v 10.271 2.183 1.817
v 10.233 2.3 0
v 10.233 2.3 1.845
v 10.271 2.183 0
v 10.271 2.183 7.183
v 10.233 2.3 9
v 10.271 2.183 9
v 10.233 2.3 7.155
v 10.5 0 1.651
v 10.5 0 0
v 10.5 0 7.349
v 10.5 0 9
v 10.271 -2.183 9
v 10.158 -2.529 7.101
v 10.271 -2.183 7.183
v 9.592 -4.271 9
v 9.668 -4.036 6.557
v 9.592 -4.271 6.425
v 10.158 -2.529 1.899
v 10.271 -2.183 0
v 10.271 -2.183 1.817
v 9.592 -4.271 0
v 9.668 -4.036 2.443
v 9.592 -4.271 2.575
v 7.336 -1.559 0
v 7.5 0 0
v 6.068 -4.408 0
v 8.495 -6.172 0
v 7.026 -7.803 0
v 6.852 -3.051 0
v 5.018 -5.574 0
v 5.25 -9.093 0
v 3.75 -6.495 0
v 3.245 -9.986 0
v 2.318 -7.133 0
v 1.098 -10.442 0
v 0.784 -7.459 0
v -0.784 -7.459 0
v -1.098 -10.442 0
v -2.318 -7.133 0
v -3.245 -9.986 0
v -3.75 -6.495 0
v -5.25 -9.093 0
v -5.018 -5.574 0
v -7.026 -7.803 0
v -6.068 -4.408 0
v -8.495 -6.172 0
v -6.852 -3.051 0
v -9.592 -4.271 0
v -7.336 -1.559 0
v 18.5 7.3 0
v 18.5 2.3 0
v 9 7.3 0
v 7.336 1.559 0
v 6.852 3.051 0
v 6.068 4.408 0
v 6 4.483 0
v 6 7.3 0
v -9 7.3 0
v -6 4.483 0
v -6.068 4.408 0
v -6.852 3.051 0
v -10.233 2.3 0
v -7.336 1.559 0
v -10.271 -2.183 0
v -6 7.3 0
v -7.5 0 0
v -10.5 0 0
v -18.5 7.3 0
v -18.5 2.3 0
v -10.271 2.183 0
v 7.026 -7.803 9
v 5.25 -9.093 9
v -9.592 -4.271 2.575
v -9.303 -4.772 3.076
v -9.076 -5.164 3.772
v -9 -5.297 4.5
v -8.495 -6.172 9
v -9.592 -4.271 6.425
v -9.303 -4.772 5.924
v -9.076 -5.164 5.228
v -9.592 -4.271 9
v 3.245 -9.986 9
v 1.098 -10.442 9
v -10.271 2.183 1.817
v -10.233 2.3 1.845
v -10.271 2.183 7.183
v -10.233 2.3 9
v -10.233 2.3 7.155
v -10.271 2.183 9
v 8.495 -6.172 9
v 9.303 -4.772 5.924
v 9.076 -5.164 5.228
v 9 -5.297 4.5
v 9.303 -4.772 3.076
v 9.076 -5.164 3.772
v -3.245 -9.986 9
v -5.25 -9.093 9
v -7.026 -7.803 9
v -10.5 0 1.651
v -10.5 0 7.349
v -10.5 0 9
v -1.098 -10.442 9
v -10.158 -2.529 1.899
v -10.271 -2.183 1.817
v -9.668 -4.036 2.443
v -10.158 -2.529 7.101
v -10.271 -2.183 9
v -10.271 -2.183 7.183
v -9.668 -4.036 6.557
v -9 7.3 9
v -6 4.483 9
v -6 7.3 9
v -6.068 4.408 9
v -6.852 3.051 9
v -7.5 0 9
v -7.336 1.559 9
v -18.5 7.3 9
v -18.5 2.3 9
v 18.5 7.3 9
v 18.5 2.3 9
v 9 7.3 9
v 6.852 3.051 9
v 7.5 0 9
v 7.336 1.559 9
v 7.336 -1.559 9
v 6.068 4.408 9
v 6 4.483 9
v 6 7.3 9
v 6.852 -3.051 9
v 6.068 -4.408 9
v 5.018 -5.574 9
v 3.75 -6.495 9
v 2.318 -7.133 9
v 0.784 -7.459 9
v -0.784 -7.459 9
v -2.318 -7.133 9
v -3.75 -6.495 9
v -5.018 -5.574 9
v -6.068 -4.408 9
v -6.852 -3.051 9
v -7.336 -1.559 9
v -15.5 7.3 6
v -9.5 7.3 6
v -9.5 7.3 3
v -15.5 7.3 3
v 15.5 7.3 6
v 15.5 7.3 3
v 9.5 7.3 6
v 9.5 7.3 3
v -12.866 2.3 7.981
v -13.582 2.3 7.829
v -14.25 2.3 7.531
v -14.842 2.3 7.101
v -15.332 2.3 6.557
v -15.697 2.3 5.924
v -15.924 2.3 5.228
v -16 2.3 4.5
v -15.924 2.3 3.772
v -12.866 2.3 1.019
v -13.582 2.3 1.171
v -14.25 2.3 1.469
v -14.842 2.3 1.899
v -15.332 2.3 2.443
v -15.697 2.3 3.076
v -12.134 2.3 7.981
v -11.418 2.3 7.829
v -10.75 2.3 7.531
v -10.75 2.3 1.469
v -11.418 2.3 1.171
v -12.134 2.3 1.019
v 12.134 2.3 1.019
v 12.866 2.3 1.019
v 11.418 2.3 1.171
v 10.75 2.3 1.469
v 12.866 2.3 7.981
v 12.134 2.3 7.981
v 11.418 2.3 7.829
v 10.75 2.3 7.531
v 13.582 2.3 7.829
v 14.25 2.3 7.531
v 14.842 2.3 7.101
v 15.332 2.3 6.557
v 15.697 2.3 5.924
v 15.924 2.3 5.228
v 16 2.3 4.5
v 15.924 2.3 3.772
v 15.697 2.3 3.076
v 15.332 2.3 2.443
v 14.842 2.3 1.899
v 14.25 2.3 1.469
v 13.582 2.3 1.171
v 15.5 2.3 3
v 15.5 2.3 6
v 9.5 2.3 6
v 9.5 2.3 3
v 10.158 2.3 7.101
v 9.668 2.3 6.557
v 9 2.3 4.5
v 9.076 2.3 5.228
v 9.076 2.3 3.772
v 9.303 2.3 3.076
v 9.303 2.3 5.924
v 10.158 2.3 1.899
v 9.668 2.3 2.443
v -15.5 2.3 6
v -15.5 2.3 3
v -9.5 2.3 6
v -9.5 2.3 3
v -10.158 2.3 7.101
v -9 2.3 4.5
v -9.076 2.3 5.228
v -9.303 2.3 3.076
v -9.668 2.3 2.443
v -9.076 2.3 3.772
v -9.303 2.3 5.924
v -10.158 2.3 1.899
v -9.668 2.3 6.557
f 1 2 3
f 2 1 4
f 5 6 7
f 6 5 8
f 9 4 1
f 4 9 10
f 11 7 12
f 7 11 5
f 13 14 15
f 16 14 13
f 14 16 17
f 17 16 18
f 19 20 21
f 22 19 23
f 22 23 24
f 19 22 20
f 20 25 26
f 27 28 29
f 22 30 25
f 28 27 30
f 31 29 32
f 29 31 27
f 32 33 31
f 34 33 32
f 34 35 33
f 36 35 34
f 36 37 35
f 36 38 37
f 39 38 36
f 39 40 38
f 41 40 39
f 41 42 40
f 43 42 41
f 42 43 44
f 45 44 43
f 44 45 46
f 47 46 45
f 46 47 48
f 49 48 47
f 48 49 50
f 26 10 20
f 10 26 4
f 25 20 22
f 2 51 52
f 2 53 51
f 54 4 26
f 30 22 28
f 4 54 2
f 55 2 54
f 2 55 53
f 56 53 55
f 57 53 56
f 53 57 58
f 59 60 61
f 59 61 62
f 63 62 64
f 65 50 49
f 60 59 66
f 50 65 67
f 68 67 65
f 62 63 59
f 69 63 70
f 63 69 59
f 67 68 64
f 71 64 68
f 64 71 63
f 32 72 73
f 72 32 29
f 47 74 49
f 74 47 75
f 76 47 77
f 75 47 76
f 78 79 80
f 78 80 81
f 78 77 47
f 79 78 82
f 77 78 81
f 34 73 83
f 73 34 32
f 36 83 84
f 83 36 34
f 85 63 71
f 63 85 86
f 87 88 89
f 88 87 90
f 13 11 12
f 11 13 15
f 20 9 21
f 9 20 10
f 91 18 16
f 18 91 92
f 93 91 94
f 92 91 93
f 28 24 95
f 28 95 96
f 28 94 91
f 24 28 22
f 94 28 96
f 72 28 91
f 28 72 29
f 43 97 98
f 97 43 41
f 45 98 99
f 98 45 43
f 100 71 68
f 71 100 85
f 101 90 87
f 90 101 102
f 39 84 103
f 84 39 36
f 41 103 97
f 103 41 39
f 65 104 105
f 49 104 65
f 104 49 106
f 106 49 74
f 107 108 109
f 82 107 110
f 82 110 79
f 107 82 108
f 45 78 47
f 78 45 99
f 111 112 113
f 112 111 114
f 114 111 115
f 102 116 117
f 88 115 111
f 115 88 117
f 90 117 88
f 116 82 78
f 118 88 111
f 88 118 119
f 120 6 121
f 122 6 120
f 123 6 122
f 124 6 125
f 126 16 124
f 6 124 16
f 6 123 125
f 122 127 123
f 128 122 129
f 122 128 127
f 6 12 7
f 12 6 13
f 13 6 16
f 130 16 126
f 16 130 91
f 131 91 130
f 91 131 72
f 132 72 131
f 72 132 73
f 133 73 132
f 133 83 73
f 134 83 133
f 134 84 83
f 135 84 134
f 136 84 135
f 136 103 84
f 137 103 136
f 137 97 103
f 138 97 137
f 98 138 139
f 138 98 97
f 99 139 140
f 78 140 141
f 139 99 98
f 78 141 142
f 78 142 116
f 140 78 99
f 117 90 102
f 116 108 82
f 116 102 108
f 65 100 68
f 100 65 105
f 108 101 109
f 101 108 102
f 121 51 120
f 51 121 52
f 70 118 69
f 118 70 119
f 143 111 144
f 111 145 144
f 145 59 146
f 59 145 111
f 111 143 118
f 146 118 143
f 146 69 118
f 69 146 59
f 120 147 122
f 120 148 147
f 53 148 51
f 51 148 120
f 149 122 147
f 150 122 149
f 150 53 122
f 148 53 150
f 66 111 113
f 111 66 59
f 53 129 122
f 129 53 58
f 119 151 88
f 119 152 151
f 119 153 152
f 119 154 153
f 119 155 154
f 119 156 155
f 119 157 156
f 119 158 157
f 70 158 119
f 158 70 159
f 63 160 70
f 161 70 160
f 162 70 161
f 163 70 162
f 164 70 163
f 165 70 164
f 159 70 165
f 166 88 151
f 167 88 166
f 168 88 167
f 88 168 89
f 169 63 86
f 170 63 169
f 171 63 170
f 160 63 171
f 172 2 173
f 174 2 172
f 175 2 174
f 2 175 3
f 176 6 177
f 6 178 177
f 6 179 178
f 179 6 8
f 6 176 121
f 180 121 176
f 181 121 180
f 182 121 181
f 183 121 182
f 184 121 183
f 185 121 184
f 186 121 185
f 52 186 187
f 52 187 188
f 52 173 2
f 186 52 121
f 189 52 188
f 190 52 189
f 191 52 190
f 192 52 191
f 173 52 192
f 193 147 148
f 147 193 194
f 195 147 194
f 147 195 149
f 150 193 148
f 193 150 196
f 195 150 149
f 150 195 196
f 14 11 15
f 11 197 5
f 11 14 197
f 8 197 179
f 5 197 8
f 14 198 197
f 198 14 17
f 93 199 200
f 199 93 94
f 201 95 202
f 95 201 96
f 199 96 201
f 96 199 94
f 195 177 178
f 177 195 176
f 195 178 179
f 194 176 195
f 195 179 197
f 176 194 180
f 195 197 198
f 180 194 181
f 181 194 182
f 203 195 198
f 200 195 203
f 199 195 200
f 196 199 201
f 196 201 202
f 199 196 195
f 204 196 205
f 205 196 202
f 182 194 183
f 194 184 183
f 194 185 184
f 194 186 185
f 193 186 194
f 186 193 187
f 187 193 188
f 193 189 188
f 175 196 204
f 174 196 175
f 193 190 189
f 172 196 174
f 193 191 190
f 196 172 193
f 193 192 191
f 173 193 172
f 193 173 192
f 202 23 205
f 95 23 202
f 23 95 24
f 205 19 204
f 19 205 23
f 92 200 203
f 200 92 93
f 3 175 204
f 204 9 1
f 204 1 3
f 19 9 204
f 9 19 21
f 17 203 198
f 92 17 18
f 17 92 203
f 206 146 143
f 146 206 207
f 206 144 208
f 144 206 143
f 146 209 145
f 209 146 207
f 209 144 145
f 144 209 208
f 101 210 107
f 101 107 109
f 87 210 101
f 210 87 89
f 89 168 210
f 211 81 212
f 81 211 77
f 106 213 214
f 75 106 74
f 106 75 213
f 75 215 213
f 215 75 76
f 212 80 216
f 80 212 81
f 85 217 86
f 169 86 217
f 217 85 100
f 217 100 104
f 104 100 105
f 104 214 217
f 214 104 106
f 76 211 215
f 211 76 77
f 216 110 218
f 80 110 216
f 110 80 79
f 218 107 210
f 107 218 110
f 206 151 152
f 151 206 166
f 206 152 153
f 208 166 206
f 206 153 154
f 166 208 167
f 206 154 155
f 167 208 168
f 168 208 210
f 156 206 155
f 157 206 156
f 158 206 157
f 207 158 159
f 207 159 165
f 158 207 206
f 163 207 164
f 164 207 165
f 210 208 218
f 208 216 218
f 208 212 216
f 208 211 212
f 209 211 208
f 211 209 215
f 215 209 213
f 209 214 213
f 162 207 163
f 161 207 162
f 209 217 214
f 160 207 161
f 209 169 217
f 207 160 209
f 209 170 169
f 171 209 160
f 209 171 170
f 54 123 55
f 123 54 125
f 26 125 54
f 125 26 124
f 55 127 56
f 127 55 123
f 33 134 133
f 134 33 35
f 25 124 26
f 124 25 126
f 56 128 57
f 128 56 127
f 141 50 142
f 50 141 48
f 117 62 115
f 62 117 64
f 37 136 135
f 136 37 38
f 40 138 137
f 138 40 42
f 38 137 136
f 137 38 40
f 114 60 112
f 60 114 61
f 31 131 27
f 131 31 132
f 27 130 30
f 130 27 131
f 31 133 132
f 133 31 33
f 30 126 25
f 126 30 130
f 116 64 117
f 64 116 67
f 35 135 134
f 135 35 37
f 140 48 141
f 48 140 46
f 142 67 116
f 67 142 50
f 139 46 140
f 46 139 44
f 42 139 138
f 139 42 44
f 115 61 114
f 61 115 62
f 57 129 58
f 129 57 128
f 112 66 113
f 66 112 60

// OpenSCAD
//******************
//Adjustable Variables
//******************

$fn =30;
lmuuOuterD = 15;
ShellSize = 3;
MBoltSize = 3;
MountHolesCenters = 25;
BaseOffset = 0.2;
MountThickness = 5;
HolderWidthMultiplier = 2; 

//******************

//Other Variables Used
MountLength = MountHolesCenters+(MBoltSize*2)+(ShellSize*2);
HolderWidth = MBoltSize+(HolderWidthMultiplier*ShellSize);

difference()
{
	union()
	{
//Outer Cylinder
		translate([0,0,HolderWidth/2])
			cylinder(r=lmuuOuterD/2 +ShellSize,h =HolderWidth,center=true);
//Base Mounting
		translate([MountLength/-2,(lmuuOuterD/2)-BaseOffset-MountThickness,0])
			cube([MountLength,MountThickness,HolderWidth]);
		
	}
//Bottom Cut
	translate([(lmuuOuterD+ShellSize)/-2,(lmuuOuterD/2)-BaseOffset,0])
			cube([lmuuOuterD+(ShellSize),ShellSize*2,HolderWidth]);
	
//Inner Cylinder
	translate([0,0,HolderWidth/2])
		cylinder(r = lmuuOuterD/2,h = HolderWidth+0.1, center = true);
	
//Mounting Hole1
	translate([MountHolesCenters/2,(lmuuOuterD/2)-BaseOffset-(MountThickness/2),HolderWidth/2])
	{
		cube([MBoltSize*2,MountThickness+0.2,MBoltSize],center=true);
	rotate([90,0,0])
		translate([0,0,MountThickness/2])
		cylinder(r=MBoltSize+0.5,h=10);
	}
//Mirror of Mounting Hole1
	mirror([1,0,0]){
		translate([MountHolesCenters/2,(lmuuOuterD/2)-BaseOffset-(MountThickness/2),HolderWidth/2])
		{
			cube([MBoltSize*2,MountThickness+0.2,MBoltSize],center=true);
		rotate([90,0,0])
			translate([0,0,MountThickness/2])
				cylinder(r=MBoltSize+0.5,h=10);
		}
	}

//Blunt the pointy bits
	translate([0,(lmuuOuterD/2)-BaseOffset-ShellSize/2,HolderWidth/2])
			cube([ShellSize*4,ShellSize,HolderWidth], center = true);
}
